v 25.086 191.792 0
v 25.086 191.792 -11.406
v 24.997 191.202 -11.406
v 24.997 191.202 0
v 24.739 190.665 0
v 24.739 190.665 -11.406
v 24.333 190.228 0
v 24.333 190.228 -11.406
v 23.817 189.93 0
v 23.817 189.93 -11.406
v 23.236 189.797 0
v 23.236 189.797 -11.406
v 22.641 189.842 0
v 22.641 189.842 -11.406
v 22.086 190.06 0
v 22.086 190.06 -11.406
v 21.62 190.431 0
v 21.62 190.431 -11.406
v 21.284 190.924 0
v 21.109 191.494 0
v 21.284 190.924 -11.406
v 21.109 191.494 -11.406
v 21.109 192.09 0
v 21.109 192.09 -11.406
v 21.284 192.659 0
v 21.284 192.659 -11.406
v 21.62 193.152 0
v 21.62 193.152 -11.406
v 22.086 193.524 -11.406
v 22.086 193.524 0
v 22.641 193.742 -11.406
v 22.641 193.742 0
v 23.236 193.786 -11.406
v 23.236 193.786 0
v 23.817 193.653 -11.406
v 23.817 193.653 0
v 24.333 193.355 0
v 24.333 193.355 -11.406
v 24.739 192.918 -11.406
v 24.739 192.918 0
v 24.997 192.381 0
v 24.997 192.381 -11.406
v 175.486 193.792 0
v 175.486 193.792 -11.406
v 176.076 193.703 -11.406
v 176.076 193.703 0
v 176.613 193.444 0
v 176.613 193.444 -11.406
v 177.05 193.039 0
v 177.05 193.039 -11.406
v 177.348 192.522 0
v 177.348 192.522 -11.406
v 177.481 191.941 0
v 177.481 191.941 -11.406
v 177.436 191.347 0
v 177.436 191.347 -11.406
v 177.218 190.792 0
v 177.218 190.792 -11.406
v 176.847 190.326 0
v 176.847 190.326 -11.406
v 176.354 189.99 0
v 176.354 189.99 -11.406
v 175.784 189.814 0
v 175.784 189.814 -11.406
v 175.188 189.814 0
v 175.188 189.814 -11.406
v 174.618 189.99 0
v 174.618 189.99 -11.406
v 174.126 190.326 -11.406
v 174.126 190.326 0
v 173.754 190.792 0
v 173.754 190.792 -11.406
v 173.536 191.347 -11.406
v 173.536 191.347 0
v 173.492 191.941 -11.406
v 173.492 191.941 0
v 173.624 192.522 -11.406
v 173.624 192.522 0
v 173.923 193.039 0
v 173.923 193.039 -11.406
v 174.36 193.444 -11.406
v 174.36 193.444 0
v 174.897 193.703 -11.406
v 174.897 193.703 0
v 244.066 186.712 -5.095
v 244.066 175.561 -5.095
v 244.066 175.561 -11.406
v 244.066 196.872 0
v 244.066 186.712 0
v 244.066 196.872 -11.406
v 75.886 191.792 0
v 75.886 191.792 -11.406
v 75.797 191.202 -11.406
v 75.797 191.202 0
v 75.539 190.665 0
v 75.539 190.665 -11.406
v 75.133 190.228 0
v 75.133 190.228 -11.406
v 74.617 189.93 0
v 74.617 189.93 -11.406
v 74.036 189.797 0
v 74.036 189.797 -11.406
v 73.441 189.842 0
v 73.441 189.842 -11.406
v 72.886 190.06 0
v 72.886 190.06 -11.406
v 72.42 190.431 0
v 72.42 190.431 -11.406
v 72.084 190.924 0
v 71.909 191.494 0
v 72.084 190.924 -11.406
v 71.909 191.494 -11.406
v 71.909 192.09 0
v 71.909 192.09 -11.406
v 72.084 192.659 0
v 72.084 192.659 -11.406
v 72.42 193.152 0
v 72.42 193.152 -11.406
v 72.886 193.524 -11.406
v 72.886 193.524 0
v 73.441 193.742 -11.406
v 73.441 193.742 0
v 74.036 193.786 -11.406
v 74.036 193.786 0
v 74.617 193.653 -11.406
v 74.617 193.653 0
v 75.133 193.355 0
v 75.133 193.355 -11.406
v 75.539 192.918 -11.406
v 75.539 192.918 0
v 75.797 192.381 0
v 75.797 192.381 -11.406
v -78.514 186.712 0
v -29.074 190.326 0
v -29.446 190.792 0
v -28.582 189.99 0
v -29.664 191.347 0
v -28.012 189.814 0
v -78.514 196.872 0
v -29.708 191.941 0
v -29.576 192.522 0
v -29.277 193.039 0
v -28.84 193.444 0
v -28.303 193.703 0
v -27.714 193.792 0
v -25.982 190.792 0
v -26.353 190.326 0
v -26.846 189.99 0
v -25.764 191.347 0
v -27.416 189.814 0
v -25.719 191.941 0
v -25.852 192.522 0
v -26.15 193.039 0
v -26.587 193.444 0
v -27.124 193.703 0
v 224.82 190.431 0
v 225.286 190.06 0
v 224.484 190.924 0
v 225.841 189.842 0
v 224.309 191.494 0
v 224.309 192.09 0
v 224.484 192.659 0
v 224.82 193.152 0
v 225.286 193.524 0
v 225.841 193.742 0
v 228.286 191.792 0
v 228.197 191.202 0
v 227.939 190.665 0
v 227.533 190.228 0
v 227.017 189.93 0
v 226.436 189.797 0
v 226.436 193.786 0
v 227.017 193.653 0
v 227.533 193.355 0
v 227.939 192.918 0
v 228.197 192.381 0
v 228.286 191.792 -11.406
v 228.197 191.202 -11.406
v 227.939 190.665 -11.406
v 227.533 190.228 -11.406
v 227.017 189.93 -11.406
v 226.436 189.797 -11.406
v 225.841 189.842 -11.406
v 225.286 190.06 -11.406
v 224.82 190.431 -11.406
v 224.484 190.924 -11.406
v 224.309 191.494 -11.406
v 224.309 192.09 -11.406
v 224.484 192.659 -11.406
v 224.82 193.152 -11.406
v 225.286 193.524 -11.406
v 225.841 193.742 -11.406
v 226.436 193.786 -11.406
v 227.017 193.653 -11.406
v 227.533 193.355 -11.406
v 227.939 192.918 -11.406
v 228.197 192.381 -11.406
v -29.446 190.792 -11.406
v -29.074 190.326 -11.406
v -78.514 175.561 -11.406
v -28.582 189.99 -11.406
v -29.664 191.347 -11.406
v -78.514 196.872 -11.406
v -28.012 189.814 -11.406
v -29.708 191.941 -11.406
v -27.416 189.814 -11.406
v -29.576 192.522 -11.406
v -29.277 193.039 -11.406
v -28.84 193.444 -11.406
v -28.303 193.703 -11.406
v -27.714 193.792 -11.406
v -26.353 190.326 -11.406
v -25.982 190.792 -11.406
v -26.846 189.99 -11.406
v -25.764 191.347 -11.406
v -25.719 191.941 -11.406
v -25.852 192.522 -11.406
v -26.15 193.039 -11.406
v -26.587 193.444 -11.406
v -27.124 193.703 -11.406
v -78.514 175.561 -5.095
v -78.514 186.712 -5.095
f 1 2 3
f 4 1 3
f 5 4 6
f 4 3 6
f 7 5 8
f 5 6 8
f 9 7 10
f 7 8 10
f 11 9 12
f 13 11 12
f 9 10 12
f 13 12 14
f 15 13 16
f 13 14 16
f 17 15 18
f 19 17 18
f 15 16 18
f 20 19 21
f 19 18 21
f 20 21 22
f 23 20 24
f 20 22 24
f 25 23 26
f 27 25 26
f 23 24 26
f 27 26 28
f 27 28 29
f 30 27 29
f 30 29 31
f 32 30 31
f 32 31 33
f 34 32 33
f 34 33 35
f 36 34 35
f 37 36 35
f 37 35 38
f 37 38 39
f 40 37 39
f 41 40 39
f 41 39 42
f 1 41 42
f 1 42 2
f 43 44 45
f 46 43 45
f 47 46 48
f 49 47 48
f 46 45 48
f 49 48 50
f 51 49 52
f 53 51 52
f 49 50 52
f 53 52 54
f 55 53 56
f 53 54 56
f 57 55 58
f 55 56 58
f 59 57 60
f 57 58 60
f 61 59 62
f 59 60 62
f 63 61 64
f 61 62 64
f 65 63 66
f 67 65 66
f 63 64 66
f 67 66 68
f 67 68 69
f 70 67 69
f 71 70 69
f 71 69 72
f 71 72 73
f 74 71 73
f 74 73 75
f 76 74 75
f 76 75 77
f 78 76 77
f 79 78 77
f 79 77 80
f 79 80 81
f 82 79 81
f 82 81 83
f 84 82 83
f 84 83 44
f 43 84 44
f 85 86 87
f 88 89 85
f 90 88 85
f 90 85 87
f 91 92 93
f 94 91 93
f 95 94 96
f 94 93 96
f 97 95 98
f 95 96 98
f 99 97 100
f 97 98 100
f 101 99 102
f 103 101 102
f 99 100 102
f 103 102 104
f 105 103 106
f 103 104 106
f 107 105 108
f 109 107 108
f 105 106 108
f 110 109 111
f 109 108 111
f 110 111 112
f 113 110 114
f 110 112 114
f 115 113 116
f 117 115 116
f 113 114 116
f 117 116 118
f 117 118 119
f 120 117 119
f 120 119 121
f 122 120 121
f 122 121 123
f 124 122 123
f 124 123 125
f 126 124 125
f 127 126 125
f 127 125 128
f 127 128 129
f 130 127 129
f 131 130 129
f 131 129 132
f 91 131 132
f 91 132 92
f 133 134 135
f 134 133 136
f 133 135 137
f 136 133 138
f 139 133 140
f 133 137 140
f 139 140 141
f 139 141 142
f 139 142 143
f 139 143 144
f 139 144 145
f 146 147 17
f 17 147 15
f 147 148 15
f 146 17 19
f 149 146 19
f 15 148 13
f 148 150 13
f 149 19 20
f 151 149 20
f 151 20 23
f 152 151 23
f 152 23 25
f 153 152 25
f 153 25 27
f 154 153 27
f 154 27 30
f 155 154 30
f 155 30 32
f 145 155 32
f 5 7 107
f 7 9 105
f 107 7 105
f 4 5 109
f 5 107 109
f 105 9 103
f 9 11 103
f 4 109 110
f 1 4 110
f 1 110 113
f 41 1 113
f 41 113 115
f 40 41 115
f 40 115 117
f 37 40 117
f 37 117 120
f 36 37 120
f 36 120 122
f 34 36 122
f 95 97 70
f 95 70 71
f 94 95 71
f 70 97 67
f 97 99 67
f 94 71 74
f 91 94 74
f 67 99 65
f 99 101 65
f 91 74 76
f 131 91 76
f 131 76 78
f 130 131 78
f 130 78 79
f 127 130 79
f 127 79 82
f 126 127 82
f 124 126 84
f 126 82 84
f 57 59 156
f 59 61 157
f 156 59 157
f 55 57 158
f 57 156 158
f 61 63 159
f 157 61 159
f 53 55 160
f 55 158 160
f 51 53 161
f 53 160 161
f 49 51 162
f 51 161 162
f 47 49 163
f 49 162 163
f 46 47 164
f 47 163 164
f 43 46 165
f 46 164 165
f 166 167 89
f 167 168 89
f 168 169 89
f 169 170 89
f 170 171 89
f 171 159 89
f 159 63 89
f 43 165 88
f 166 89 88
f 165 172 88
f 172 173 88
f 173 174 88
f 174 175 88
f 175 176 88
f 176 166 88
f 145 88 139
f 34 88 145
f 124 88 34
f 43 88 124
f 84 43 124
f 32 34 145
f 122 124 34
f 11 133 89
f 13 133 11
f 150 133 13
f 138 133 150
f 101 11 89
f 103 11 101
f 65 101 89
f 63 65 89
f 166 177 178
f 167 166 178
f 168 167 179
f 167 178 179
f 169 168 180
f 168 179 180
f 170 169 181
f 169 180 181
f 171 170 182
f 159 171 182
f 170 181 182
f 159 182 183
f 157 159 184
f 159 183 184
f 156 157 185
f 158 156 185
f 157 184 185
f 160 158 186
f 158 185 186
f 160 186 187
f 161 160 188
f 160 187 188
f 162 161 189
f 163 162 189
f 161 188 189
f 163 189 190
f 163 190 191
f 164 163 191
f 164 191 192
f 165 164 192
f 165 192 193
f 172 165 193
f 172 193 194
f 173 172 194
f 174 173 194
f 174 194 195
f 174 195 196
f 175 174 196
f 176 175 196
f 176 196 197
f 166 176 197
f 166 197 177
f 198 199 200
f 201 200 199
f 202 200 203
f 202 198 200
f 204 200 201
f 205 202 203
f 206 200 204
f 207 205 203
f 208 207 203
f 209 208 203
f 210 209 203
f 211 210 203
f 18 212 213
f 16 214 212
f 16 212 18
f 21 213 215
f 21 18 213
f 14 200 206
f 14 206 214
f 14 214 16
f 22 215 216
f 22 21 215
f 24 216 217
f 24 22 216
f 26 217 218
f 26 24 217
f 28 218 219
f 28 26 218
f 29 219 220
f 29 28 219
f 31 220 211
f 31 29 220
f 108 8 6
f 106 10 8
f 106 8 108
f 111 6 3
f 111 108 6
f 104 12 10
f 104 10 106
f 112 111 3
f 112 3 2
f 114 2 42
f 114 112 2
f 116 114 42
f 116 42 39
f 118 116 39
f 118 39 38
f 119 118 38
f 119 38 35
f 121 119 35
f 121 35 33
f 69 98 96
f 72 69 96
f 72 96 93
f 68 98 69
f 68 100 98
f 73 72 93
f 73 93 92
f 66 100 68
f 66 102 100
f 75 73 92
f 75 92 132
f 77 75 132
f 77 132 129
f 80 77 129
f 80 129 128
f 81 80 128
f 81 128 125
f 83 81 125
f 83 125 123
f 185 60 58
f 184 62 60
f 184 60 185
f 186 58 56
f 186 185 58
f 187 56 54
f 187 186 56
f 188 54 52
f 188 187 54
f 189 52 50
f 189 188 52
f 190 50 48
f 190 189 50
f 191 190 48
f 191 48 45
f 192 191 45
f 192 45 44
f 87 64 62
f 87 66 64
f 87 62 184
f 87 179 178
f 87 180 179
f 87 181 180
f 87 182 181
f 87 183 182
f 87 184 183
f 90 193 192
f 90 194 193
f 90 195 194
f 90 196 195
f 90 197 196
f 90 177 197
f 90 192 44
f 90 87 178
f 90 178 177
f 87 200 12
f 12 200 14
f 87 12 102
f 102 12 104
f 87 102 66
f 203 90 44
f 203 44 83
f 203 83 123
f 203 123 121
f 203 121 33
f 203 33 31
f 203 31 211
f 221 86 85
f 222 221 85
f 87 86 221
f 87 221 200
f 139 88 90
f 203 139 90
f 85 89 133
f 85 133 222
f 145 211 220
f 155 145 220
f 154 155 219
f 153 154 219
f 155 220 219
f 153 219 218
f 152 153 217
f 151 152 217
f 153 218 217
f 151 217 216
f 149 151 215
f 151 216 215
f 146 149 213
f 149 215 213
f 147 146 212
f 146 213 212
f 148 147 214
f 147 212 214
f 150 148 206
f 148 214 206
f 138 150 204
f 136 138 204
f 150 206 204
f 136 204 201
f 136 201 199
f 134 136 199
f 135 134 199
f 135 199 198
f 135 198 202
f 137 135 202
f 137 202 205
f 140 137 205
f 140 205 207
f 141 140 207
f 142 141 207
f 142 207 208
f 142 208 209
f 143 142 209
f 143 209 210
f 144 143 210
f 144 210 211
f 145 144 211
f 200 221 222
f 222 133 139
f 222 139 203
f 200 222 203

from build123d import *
from build123d.topology import SkipClean

# Parameters (mm, degrees)
BOSS_EXTRUDE1_DEPTH     = 177.8
SKETCH2_R               = 6.35
BOSS_EXTRUDE2_DEPTH     = 3.175
CUT_EXTRUDE1_DEPTH      = 7.62
SKETCH4_R               = 35.56
CUT_EXTRUDE2_DEPTH      = 5.08
BOSS_EXTRUDE3_DEPTH     = 3.175
BOSS_EXTRUDE4_START     = -3.175
BOSS_EXTRUDE4_DEPTH     = 3.175
SKETCH2_3_R             = 6.35
CUT_EXTRUDE3_DEPTH      = 203.2
SKETCH7_W               = 104.303861479
SKETCH7_H               = 17.78
CUT_EXTRUDE4_DEPTH      = 7.62
SKETCH9_W               = 5.09491902
SKETCH9_H               = 10.16
BOSS_EXTRUDE5_DEPTH     = 373.38
SKETCH10_W              = 16.389929124
SKETCH10_H              = 55.852942909
CUT_EXTRUDE5_DEPTH      = 50.8
SKETCH11_W              = 37.311204657
SKETCH11_H              = 70.036499624
CUT_EXTRUDE6_DEPTH      = 63.5
CUT_EXTRUDE_THIN3_DEPTH = 1.27
BOSS_EXTRUDE6_DEPTH     = 1.27
BOSS_EXTRUDE6_2_DEPTH   = 1.27
BOSS_EXTRUDE6_3_DEPTH   = 1.27
BOSS_EXTRUDE6_4_DEPTH   = 1.27
SKETCH14_R              = 6.35
CUT_EXTRUDE7_DEPTH      = 6.35
SKETCH15_R              = 6.35
CUT_EXTRUDE8_DEPTH      = 6.35
SKETCH16_R              = 2
CUT_EXTRUDE9_DEPTH      = 203.2
SKETCH17_R              = 2
CUT_EXTRUDE10_DEPTH     = 50.8
CUT_EXTRUDE11_DEPTH     = 50.8
CUT_EXTRUDE12_DEPTH     = 135.636
SKETCH20_W              = 88.9
SKETCH20_H              = 19.05
CUT_EXTRUDE13_DEPTH     = 25.4
SKETCH22_W              = 88.9
SKETCH22_H              = 19.05
CUT_EXTRUDE14_DEPTH     = 25.4
CUT_EXTRUDE15_DEPTH     = 12.7
SKETCH24_R              = 1.5
CUT_EXTRUDE16_DEPTH     = 12.7
SKETCH25_W              = 227.828611999
SKETCH25_H              = 364.913546761
CUT_EXTRUDE17_DEPTH     = 381


with BuildPart() as part:
    # Sketch1 → Boss-Extrude1 (new body)
    with BuildSketch(Plane.XY):
        Polygon((174.206706958, 205.225588808), (176.700980282, 203.057350086), (6.59291173, 7.37040221), (4.098638405, 9.538640932), align=None)
        Polygon((176.700980282, 203.057350086), (176.700980282, 207.584488047), (174.206706958, 205.225588808), align=None)
        Polygon((176.700980282, 203.057350086), (176.700980282, 207.584488047), (294.86623267, 79.97762329), (292.609334988, 77.887713122), align=None)
        Polygon((176.700980282, 203.057350086), (6.59291173, 7.37040221), (11.706315855, 7.37040221), (176.700980282, 197.43083223), align=None)
        Polygon((292.609334988, 77.887713122), (179.222024463, 200.334870023), (176.700980282, 197.43083223), (289.802992908, 75.306026972), align=None)
        Polygon((179.222024463, 200.334870023), (176.700980282, 203.057350086), (176.700980282, 197.43083223), align=None)
    extrude(amount=BOSS_EXTRUDE1_DEPTH)

    # Sketch2 → Boss-Extrude2 (add)
    with BuildSketch(Plane(origin=(0, 0, 0), x_dir=(-1, 0, 0), z_dir=(0, 0, -1))):
        Polygon((-176.700980282, 207.584488047), (-294.86623267, 79.97762329), (-294.86623267, 308.57762329), (-4.03623267, 308.57762329), (-4.03623267, 9.466851346), align=None)
        with Locations((-109.551832016, 215.6073789)):
            Circle(SKETCH2_R, mode=Mode.SUBTRACT)
        with Locations((-50.099162461, 143.63835786)):
            Circle(SKETCH2_R, mode=Mode.SUBTRACT)
    boss_extrude2 = extrude(amount=-BOSS_EXTRUDE2_DEPTH)

    # Mirror1: Boss-Extrude2 across plane
    add(boss_extrude2.mirror(Plane.XY.offset(88.9)))

    # Sketch3 → Cut-Extrude1 (cut)
    with BuildSketch(Plane(origin=(-2.388376456, 2.076183978, 0), x_dir=(0.6560590289905027, 0.754709580222776, 0), z_dir=(-0.754709580222776, 0.6560590289905027, 0))):
        Polygon((146.938003774, -3.175), (147.021985505, -88.9), (210.43489334, -88.9), (210.43489334, -3.175), align=None)
        Polygon((210.43489334, -88.9), (147.021985505, -88.9), (147.047852426, -115.303859178), (210.43489334, -115.303859178), align=None)
    extrude(amount=-CUT_EXTRUDE1_DEPTH, mode=Mode.SUBTRACT)

    # Sketch4 → Cut-Extrude2 (cut)
    with BuildSketch(Plane.XY.offset(3.175)):
        with Locations((115.138547862, 136.94700246)):
            Circle(SKETCH4_R)
    extrude(amount=-CUT_EXTRUDE2_DEPTH, mode=Mode.SUBTRACT)

    # Sketch5 → Boss-Extrude3 (add)
    with BuildSketch(Plane(origin=(0, 0, 0), x_dir=(-1, 0, 0), z_dir=(0, 0, -1))):
        with BuildLine():
            Line((23.718677813, 87.809342908), (-4.03623267, 87.809342908))
            Line((-4.03623267, 87.809342908), (-4.03623267, 68.97229904))
            ThreePointArc((-4.03623267, 68.97229904), (2.710389506, 69.812621892), (6.35, 64.070123417))
            ThreePointArc((6.35, 64.070123417), (2.710389506, 58.327624943), (-4.03623267, 59.167947795))
            Line((-4.03623267, 59.167947795), (-4.03623267, 41.258157594))
            Line((-4.03623267, 41.258157594), (23.718677813, 41.258157594))
            Line((23.718677813, 41.258157594), (23.718677813, 87.809342908))
        make_face()
    extrude(amount=-BOSS_EXTRUDE3_DEPTH)

    # Sketch6 → Boss-Extrude4 (add)
    with BuildSketch(Plane.XY.offset(177.8).offset(BOSS_EXTRUDE4_START)):
        with BuildLine():
            Line((4.03623267, 68.97229904), (4.03623267, 87.809342908))
            Line((4.03623267, 87.809342908), (-23.718677813, 87.809342908))
            Line((-23.718677813, 87.809342908), (-23.718677813, 41.258157594))
            Line((-23.718677813, 41.258157594), (4.03623267, 41.258157594))
            Line((4.03623267, 41.258157594), (4.03623267, 59.167947795))
            ThreePointArc((4.03623267, 59.167947795), (-6.35, 64.070123417), (4.03623267, 68.97229904))
        make_face()
    extrude(amount=BOSS_EXTRUDE4_DEPTH)

    # Sketch2<3> → Cut-Extrude3 (cut)
    with SkipClean():  # the faces are left unmerged after this step: merging them gives an invalid solid
        with BuildSketch(Plane(origin=(0, 0, 0), x_dir=(-1, 0, 0), z_dir=(0, 0, -1))):
            with Locations((0, 64.070123417)):
                Circle(SKETCH2_3_R)
        extrude(amount=-CUT_EXTRUDE3_DEPTH, mode=Mode.SUBTRACT)

    # Sketch7 → Cut-Extrude4 (cut)
    with SkipClean():  # the faces are left unmerged after this step: merging them gives an invalid solid
        with BuildSketch(Plane(origin=(198.614996443, 183.919503291, 0), x_dir=(0, 0, -1), z_dir=(0.7337298645028701, 0.6794413042615234, 0))):
            with Locations((-88.799310538, -132.772327008)):
                Rectangle(SKETCH7_W, SKETCH7_H)
        extrude(amount=-CUT_EXTRUDE4_DEPTH, mode=Mode.SUBTRACT)

    # Sketch9 → Boss-Extrude5 (add)
    with SkipClean():  # the faces are left unmerged after this step: merging them gives an invalid solid
        with BuildSketch(Plane(origin=(294.86623267, 0, 0), x_dir=(0, 0, -1), z_dir=(1, 0, 0))):
            with Locations((2.54745951, 191.791667894)):
                Rectangle(SKETCH9_W, SKETCH9_H)
            Polygon((5.09491902, 196.871667894), (5.09491902, 186.711667894), (5.09491902, 175.560674011), (11.405822058, 175.560674011), (11.405822058, 196.871667894), align=None)
        boss_extrude5 = extrude(amount=-BOSS_EXTRUDE5_DEPTH)

    # Mirror2: Boss-Extrude5 across plane
    with SkipClean():  # the faces are left unmerged after this step: merging them gives an invalid solid
        add(boss_extrude5.mirror(Plane.XY.offset(88.9)))

    # Sketch10 → Cut-Extrude5 (cut)
    with SkipClean():  # the faces are left unmerged after this step: merging them gives an invalid solid
        with BuildSketch(Plane(origin=(294.86623267, 0, 0), x_dir=(0, 0, -1), z_dir=(1, 0, 0))):
            with Locations((8.194964562, 177.809205996)):
                Rectangle(SKETCH10_W, SKETCH10_H)
        extrude(amount=-CUT_EXTRUDE5_DEPTH, mode=Mode.SUBTRACT)

    # Sketch11 → Cut-Extrude6 (cut)
    with SkipClean():  # the faces are left unmerged after this step: merging them gives an invalid solid
        with BuildSketch(Plane(origin=(0, 0, 0), x_dir=(-1, 0, 0), z_dir=(0, 0, -1))):
            with Locations((-276.210630342, 174.143668429)):
                Rectangle(SKETCH11_W, SKETCH11_H)
        extrude(amount=-CUT_EXTRUDE6_DEPTH, mode=Mode.SUBTRACT)

    # Sketch12 → Cut-Extrude-Thin3 (cut)
    with SkipClean():  # the faces are left unmerged after this step: merging them gives an invalid solid
        with BuildSketch(Plane(origin=(198.614996443, 183.919503291, 0), x_dir=(0, 0, -1), z_dir=(0.7337298645028701, 0.6794413042615234, 0))):
            Polygon((-171.532951818, 28.022585612), (-143.20199229, -115.162103868), (-139.962790584, -114.521185535), (-168.293750113, 28.663503944), align=None)
            Polygon((-33.454545449, -115.162103868), (-6.228065693, 28.022585612), (-9.471942339, 28.639406741), (-36.698422095, -114.545282739), align=None)
        extrude(amount=-CUT_EXTRUDE_THIN3_DEPTH, mode=Mode.SUBTRACT)

    # Sketch14 → Cut-Extrude7 (cut)
    with SkipClean():  # the faces are left unmerged after this step: merging them gives an invalid solid
        with BuildSketch(Plane.XY.offset(3.175)):
            with Locations((25.62623267, 167.726388192)):
                Circle(SKETCH14_R)
        extrude(amount=-CUT_EXTRUDE7_DEPTH, mode=Mode.SUBTRACT)

    # Sketch15 → Cut-Extrude8 (cut)
    with SkipClean():  # the faces are left unmerged after this step: merging them gives an invalid solid
        with BuildSketch(Plane.XY.offset(177.8)):
            with Locations((25.62623267, 167.726388192)):
                Circle(SKETCH15_R)
        extrude(amount=-CUT_EXTRUDE8_DEPTH, mode=Mode.SUBTRACT)

    # Sketch16 → Cut-Extrude9 (cut)
    with SkipClean():  # the faces are left unmerged after this step: merging them gives an invalid solid
        with BuildSketch(Plane(origin=(0, 0, -11.405822058), x_dir=(-1, 0, 0), z_dir=(0, 0, -1))):
            with Locations(Location((-226.28623267, 191.791667894, 0), (0, 0, 180))):
                Circle(SKETCH16_R)
            with Locations(Location((-175.48623267, 191.791667894, 0), (0, 0, 90))):
                Circle(SKETCH16_R)
            with Locations(Location((-73.88623267, 191.791667894, 0), (0, 0, 180))):
                Circle(SKETCH16_R)
            with Locations(Location((-23.08623267, 191.791667894, 0), (0, 0, 180))):
                Circle(SKETCH16_R)
            with Locations(Location((27.71376733, 191.791667894, 0), (0, 0, 90))):
                Circle(SKETCH16_R)
        extrude(amount=-CUT_EXTRUDE9_DEPTH, mode=Mode.SUBTRACT)

    # Sketch17 → Cut-Extrude10 (cut)
    with SkipClean():  # the faces are left unmerged after this step: merging them gives an invalid solid
        with BuildSketch(Plane.XY.offset(189.205822058)):
            with Locations((272.00623267, 191.73762329)):
                Circle(SKETCH17_R)
        extrude(amount=-CUT_EXTRUDE10_DEPTH, mode=Mode.SUBTRACT)

    # Sketch18 → Cut-Extrude11 (cut)
    with SkipClean():  # the faces are left unmerged after this step: merging them gives an invalid solid
        with BuildSketch(Plane(origin=(198.614996443, 183.919503291, 0), x_dir=(0, 0, -1), z_dir=(0.7337298645028701, 0.6794413042615234, 0))):
            Polygon((-170.82495725, -33.509501551), (-170.82495725, -115.912858784), (-148.021512482, -115.912858784), (-165.124096058, -33.509501551), align=None)
        extrude(amount=-CUT_EXTRUDE11_DEPTH, mode=Mode.SUBTRACT)

    # Sketch19 → Cut-Extrude12 (cut)
    with SkipClean():  # the faces are left unmerged after this step: merging them gives an invalid solid
        with BuildSketch(Plane(origin=(198.614996443, 183.919503291, 0), x_dir=(0, 0, -1), z_dir=(0.7337298645028701, 0.6794413042615234, 0))):
            Polygon((-27.790980507, -115.912858784), (-12.83560064, -35.35545082), (-7.206169917, -35.35545082), (-7.206169917, -115.912858784), align=None)
        extrude(amount=-CUT_EXTRUDE12_DEPTH, mode=Mode.SUBTRACT)

    # Sketch20 → Cut-Extrude13 (cut)
    with SkipClean():  # the faces are left unmerged after this step: merging them gives an invalid solid
        with BuildSketch(Plane.XY.offset(177.8)):
            with BuildLine():
                Line((162.857920191, 291.02562329), (162.857920191, 292.57562329))
                Line((162.857920191, 292.57562329), (164.407920191, 292.57562329))
                ThreePointArc((164.407920191, 292.57562329), (161.76190468, 293.671638801), (162.857920191, 291.02562329))
            make_face()
            with BuildLine():
                Line((164.407920191, 292.57562329), (162.857920191, 292.57562329))
                Line((162.857920191, 292.57562329), (162.857920191, 291.02562329))
                ThreePointArc((162.857920191, 291.02562329), (163.953935702, 291.479607779), (164.407920191, 292.57562329))
            make_face()
            with BuildLine():
                ThreePointArc((266.007920191, 292.57562329), (264.457920191, 294.12562329), (262.907920191, 292.57562329))
                Line((262.907920191, 292.57562329), (264.457920191, 292.57562329))
                Line((264.457920191, 292.57562329), (264.457920191, 291.02562329))
                ThreePointArc((264.457920191, 291.02562329), (265.553935702, 291.479607779), (266.007920191, 292.57562329))
            make_face()
            with BuildLine():
                Line((264.457920191, 292.57562329), (262.907920191, 292.57562329))
                ThreePointArc((262.907920191, 292.57562329), (263.36190468, 291.479607779), (264.457920191, 291.02562329))
                Line((264.457920191, 291.02562329), (264.457920191, 292.57562329))
            make_face()
            with BuildLine():
                ThreePointArc((164.407920191, 241.77562329), (163.953935702, 242.871638801), (162.857920191, 243.32562329))
                Line((162.857920191, 243.32562329), (162.857920191, 241.77562329))
                Line((162.857920191, 241.77562329), (164.407920191, 241.77562329))
            make_face()
            with BuildLine():
                Line((162.857920191, 241.77562329), (162.857920191, 243.32562329))
                ThreePointArc((162.857920191, 243.32562329), (161.76190468, 240.679607779), (164.407920191, 241.77562329))
                Line((164.407920191, 241.77562329), (162.857920191, 241.77562329))
            make_face()
            with BuildLine():
                ThreePointArc((266.007920191, 241.77562329), (265.553935702, 242.871638801), (264.457920191, 243.32562329))
                Line((264.457920191, 243.32562329), (264.457920191, 241.77562329))
                Line((264.457920191, 241.77562329), (262.907920191, 241.77562329))
                ThreePointArc((262.907920191, 241.77562329), (264.457920191, 240.22562329), (266.007920191, 241.77562329))
            make_face()
            with BuildLine():
                Line((264.457920191, 241.77562329), (264.457920191, 243.32562329))
                ThreePointArc((264.457920191, 243.32562329), (263.36190468, 242.871638801), (262.907920191, 241.77562329))
                Line((262.907920191, 241.77562329), (264.457920191, 241.77562329))
            make_face()
            with Locations((213.657920191, 282.969686208)):
                Rectangle(SKETCH20_W, SKETCH20_H)
        extrude(amount=-CUT_EXTRUDE13_DEPTH, mode=Mode.SUBTRACT)

    # Sketch22 → Cut-Extrude14 (cut)
    with SkipClean():  # the faces are left unmerged after this step: merging them gives an invalid solid
        with BuildSketch(Plane(origin=(0, 0, 0), x_dir=(-1, 0, 0), z_dir=(0, 0, -1))):
            with BuildLine():
                Line((-264.581570713, 291.02562329), (-264.581570713, 292.57562329))
                Line((-264.581570713, 292.57562329), (-263.031570713, 292.57562329))
                ThreePointArc((-263.031570713, 292.57562329), (-265.677586224, 293.671638801), (-264.581570713, 291.02562329))
            make_face()
            with BuildLine():
                Line((-263.031570713, 292.57562329), (-264.581570713, 292.57562329))
                Line((-264.581570713, 292.57562329), (-264.581570713, 291.02562329))
                ThreePointArc((-264.581570713, 291.02562329), (-263.485555202, 291.479607779), (-263.031570713, 292.57562329))
            make_face()
            with BuildLine():
                ThreePointArc((-263.031570713, 241.77562329), (-263.485555202, 242.871638801), (-264.581570713, 243.32562329))
                Line((-264.581570713, 243.32562329), (-264.581570713, 241.77562329))
                Line((-264.581570713, 241.77562329), (-263.031570713, 241.77562329))
            make_face()
            with BuildLine():
                Line((-264.581570713, 241.77562329), (-264.581570713, 243.32562329))
                ThreePointArc((-264.581570713, 243.32562329), (-265.677586224, 240.679607779), (-263.031570713, 241.77562329))
                Line((-263.031570713, 241.77562329), (-264.581570713, 241.77562329))
            make_face()
            with BuildLine():
                ThreePointArc((-161.431570713, 292.57562329), (-162.981570713, 294.12562329), (-164.531570713, 292.57562329))
                Line((-164.531570713, 292.57562329), (-162.981570713, 292.57562329))
                Line((-162.981570713, 292.57562329), (-162.981570713, 291.02562329))
                ThreePointArc((-162.981570713, 291.02562329), (-161.885555202, 291.479607779), (-161.431570713, 292.57562329))
            make_face()
            with BuildLine():
                Line((-162.981570713, 292.57562329), (-164.531570713, 292.57562329))
                ThreePointArc((-164.531570713, 292.57562329), (-164.077586224, 291.479607779), (-162.981570713, 291.02562329))
                Line((-162.981570713, 291.02562329), (-162.981570713, 292.57562329))
            make_face()
            with BuildLine():
                ThreePointArc((-161.431570713, 241.77562329), (-161.885555202, 242.871638801), (-162.981570713, 243.32562329))
                Line((-162.981570713, 243.32562329), (-162.981570713, 241.77562329))
                Line((-162.981570713, 241.77562329), (-164.531570713, 241.77562329))
                ThreePointArc((-164.531570713, 241.77562329), (-162.981570713, 240.22562329), (-161.431570713, 241.77562329))
            make_face()
            with BuildLine():
                Line((-162.981570713, 241.77562329), (-162.981570713, 243.32562329))
                ThreePointArc((-162.981570713, 243.32562329), (-164.077586224, 242.871638801), (-164.531570713, 241.77562329))
                Line((-164.531570713, 241.77562329), (-162.981570713, 241.77562329))
            make_face()
            with Locations((-213.781570713, 283.028383525)):
                Rectangle(SKETCH22_W, SKETCH22_H)
        extrude(amount=-CUT_EXTRUDE14_DEPTH, mode=Mode.SUBTRACT)

    # Sketch23 → Cut-Extrude15 (cut)
    with SkipClean():  # the faces are left unmerged after this step: merging them gives an invalid solid
        with BuildSketch(Plane(origin=(0, 0, 0), x_dir=(-1, 0, 0), z_dir=(0, 0, -1))):
            with BuildLine():
                ThreePointArc((-281.46966057, 89.27791623), (-283.589396682, 89.195947845), (-283.507428297, 87.076211733))
                Line((-283.507428297, 87.076211733), (-281.46966057, 89.27791623))
            make_face()
            with BuildLine():
                Line((-281.46966057, 89.27791623), (-283.507428297, 87.076211733))
                ThreePointArc((-283.507428297, 87.076211733), (-281.887847254, 86.802595758), (-280.988544434, 88.177063981))
                ThreePointArc((-280.988544434, 88.177063981), (-281.11407621, 88.777761162), (-281.46966057, 89.27791623))
            make_face()
            with BuildLine():
                ThreePointArc((-261.677113571, 110.662757672), (-263.796849683, 110.580789287), (-263.714881298, 108.461053175))
                Line((-263.714881298, 108.461053175), (-261.677113571, 110.662757672))
            make_face()
            with BuildLine():
                Line((-261.677113571, 110.662757672), (-263.714881298, 108.461053175))
                ThreePointArc((-263.714881298, 108.461053175), (-262.095300254, 108.1874372), (-261.195997434, 109.561905424))
                ThreePointArc((-261.195997434, 109.561905424), (-261.321529211, 110.162602604), (-261.677113571, 110.662757672))
            make_face()
            with BuildLine():
                ThreePointArc((-242.471013434, 131.413973074), (-244.590749546, 131.332004689), (-244.508781161, 129.212268577))
                Line((-244.508781161, 129.212268577), (-242.471013434, 131.413973074))
            make_face()
            with BuildLine():
                Line((-242.471013434, 131.413973074), (-244.508781161, 129.212268577))
                ThreePointArc((-244.508781161, 129.212268577), (-242.889200117, 128.938652602), (-241.989897298, 130.313120826))
                ThreePointArc((-241.989897298, 130.313120826), (-242.115429074, 130.913818006), (-242.471013434, 131.413973074))
            make_face()
            with BuildLine():
                ThreePointArc((-221.219107983, 154.375577179), (-223.338844094, 154.293608794), (-223.256875709, 152.173872682))
                Line((-223.256875709, 152.173872682), (-221.219107983, 154.375577179))
            make_face()
            with BuildLine():
                Line((-221.219107983, 154.375577179), (-223.256875709, 152.173872682))
                ThreePointArc((-223.256875709, 152.173872682), (-221.637294666, 151.900256707), (-220.737991846, 153.274724931))
                ThreePointArc((-220.737991846, 153.274724931), (-220.863523622, 153.875422111), (-221.219107983, 154.375577179))
            make_face()
            with BuildLine():
                ThreePointArc((-145.886078234, 168.131923716), (-146.764955289, 169.497283115), (-148.371686616, 169.262665118))
                Line((-148.371686616, 169.262665118), (-146.400469852, 167.001182315))
                ThreePointArc((-146.400469852, 167.001182315), (-146.020718836, 167.510800771), (-145.886078234, 168.131923716))
            make_face()
            with BuildLine():
                Line((-146.400469852, 167.001182315), (-148.371686616, 169.262665118))
                ThreePointArc((-148.371686616, 169.262665118), (-148.516819636, 167.146315334), (-146.400469852, 167.001182315))
            make_face()
            with BuildLine():
                ThreePointArc((-49.387047149, 57.423196347), (-50.265924204, 58.788555745), (-51.872655531, 58.553937749))
                Line((-51.872655531, 58.553937749), (-49.901438767, 56.292454945))
                ThreePointArc((-49.901438767, 56.292454945), (-49.521687751, 56.802073401), (-49.387047149, 57.423196347))
            make_face()
            with BuildLine():
                Line((-49.901438767, 56.292454945), (-51.872655531, 58.553937749))
                ThreePointArc((-51.872655531, 58.553937749), (-52.017788551, 56.437587965), (-49.901438767, 56.292454945))
            make_face()
            with BuildLine():
                ThreePointArc((-31.668427664, 37.095470857), (-32.547304719, 38.460830256), (-34.154036046, 38.226212259))
                Line((-34.154036046, 38.226212259), (-32.182819282, 35.964729456))
                ThreePointArc((-32.182819282, 35.964729456), (-31.803068266, 36.474347912), (-31.668427664, 37.095470857))
            make_face()
            with BuildLine():
                Line((-32.182819282, 35.964729456), (-34.154036046, 38.226212259))
                ThreePointArc((-34.154036046, 38.226212259), (-34.299169066, 36.109862475), (-32.182819282, 35.964729456))
            make_face()
            with BuildLine():
                ThreePointArc((-16.066850555, 19.196526928), (-16.94572761, 20.561886326), (-18.552458937, 20.327268329))
                Line((-18.552458937, 20.327268329), (-16.581242173, 18.065785526))
                ThreePointArc((-16.581242173, 18.065785526), (-16.201491157, 18.575403982), (-16.066850555, 19.196526928))
            make_face()
            with BuildLine():
                Line((-16.581242173, 18.065785526), (-18.552458937, 20.327268329))
                ThreePointArc((-18.552458937, 20.327268329), (-18.697591957, 18.210918546), (-16.581242173, 18.065785526))
            make_face()
        extrude(amount=-CUT_EXTRUDE15_DEPTH, mode=Mode.SUBTRACT)

    # Sketch24 → Cut-Extrude16 (cut)
    with SkipClean():  # the faces are left unmerged after this step: merging them gives an invalid solid
        with BuildSketch(Plane.XY.offset(177.8)):
            with Locations((277.221839581, 93.68533948)):
                Circle(SKETCH24_R)
            with Locations((256.088046252, 116.620130178)):
                Circle(SKETCH24_R)
            with Locations((233.352788284, 141.292860476)):
                Circle(SKETCH24_R)
            with Locations((211.758500856, 164.727388047)):
                Circle(SKETCH24_R)
            with Locations((135.020648746, 154.397680008)):
                Circle(SKETCH24_R)
            with Locations((113.672052573, 129.804959434)):
                Circle(SKETCH24_R)
            with Locations((89.546525068, 102.013326118)):
                Circle(SKETCH24_R)
            with Locations((62.67652141, 71.060167118)):
                Circle(SKETCH24_R)
            with Locations((39.522371339, 44.387521375)):
                Circle(SKETCH24_R)
        extrude(amount=-CUT_EXTRUDE16_DEPTH, mode=Mode.SUBTRACT)


with BuildPart() as body_2:
    # Sketch13 → Boss-Extrude6 (new body)
    with BuildSketch(Plane(origin=(198.614996443, 183.919503291, 0), x_dir=(0, 0, -1), z_dir=(0.7337298645028701, 0.6794413042615234, 0))):
        Polygon((-171.532951818, 28.022585612), (-171.375187306, 27.225243654), (-168.293750113, 28.663503944), align=None)
    extrude(amount=-BOSS_EXTRUDE6_DEPTH)


with BuildPart() as body_3:
    # Sketch13 → Boss-Extrude6 2 (new body)
    with BuildSketch(Plane(origin=(198.614996443, 183.919503291, 0), x_dir=(0, 0, -1), z_dir=(0.7337298645028701, 0.6794413042615234, 0))):
        Polygon((-143.20199229, -115.162103868), (-140.120555097, -113.723843577), (-139.962790584, -114.521185535), align=None)
    extrude(amount=-BOSS_EXTRUDE6_2_DEPTH)


with BuildPart() as body_4:
    # Sketch13 → Boss-Extrude6 3 (new body)
    with BuildSketch(Plane(origin=(198.614996443, 183.919503291, 0), x_dir=(0, 0, -1), z_dir=(0.7337298645028701, 0.6794413042615234, 0))):
        Polygon((-9.471942339, 28.639406741), (-6.382619108, 27.209785612), (-6.228065693, 28.022585612), align=None)
    extrude(amount=-BOSS_EXTRUDE6_3_DEPTH)


with BuildPart() as body_5:
    # Sketch13 → Boss-Extrude6 4 (new body)
    with BuildSketch(Plane(origin=(198.614996443, 183.919503291, 0), x_dir=(0, 0, -1), z_dir=(0.7337298645028701, 0.6794413042615234, 0))):
        Polygon((-36.698422095, -114.545282739), (-33.302712556, -114.363611155), (-33.454545449, -115.162103868), align=None)
    extrude(amount=-BOSS_EXTRUDE6_4_DEPTH)


with BuildPart() as cut_extrude17_tool:
    # Sketch25 → Cut-Extrude17 (new body)
    with BuildSketch(Plane(origin=(294.86623267, 0, 0), x_dir=(0, 0, -1), z_dir=(1, 0, 0))):
        with Locations((-113.914306, 126.12084991)):
            Rectangle(SKETCH25_W, SKETCH25_H)
    extrude(amount=-CUT_EXTRUDE17_DEPTH)


with BuildPart() as part_1:
    add(part.part)

    # Cut-Extrude17: cut by cut_extrude17_tool
    add(cut_extrude17_tool.part, mode=Mode.SUBTRACT)


with BuildPart() as body_2_1:
    add(body_2.part)

    # Cut-Extrude17: cut by cut_extrude17_tool
    add(cut_extrude17_tool.part, mode=Mode.SUBTRACT)


with BuildPart() as body_3_1:
    add(body_3.part)

    # Cut-Extrude17: cut by cut_extrude17_tool
    add(cut_extrude17_tool.part, mode=Mode.SUBTRACT)


with BuildPart() as body_4_1:
    add(body_4.part)

    # Cut-Extrude17: cut by cut_extrude17_tool
    add(cut_extrude17_tool.part, mode=Mode.SUBTRACT)


with BuildPart() as body_5_1:
    add(body_5.part)

    # Cut-Extrude17: cut by cut_extrude17_tool
    add(cut_extrude17_tool.part, mode=Mode.SUBTRACT)


solid = part_1.part
